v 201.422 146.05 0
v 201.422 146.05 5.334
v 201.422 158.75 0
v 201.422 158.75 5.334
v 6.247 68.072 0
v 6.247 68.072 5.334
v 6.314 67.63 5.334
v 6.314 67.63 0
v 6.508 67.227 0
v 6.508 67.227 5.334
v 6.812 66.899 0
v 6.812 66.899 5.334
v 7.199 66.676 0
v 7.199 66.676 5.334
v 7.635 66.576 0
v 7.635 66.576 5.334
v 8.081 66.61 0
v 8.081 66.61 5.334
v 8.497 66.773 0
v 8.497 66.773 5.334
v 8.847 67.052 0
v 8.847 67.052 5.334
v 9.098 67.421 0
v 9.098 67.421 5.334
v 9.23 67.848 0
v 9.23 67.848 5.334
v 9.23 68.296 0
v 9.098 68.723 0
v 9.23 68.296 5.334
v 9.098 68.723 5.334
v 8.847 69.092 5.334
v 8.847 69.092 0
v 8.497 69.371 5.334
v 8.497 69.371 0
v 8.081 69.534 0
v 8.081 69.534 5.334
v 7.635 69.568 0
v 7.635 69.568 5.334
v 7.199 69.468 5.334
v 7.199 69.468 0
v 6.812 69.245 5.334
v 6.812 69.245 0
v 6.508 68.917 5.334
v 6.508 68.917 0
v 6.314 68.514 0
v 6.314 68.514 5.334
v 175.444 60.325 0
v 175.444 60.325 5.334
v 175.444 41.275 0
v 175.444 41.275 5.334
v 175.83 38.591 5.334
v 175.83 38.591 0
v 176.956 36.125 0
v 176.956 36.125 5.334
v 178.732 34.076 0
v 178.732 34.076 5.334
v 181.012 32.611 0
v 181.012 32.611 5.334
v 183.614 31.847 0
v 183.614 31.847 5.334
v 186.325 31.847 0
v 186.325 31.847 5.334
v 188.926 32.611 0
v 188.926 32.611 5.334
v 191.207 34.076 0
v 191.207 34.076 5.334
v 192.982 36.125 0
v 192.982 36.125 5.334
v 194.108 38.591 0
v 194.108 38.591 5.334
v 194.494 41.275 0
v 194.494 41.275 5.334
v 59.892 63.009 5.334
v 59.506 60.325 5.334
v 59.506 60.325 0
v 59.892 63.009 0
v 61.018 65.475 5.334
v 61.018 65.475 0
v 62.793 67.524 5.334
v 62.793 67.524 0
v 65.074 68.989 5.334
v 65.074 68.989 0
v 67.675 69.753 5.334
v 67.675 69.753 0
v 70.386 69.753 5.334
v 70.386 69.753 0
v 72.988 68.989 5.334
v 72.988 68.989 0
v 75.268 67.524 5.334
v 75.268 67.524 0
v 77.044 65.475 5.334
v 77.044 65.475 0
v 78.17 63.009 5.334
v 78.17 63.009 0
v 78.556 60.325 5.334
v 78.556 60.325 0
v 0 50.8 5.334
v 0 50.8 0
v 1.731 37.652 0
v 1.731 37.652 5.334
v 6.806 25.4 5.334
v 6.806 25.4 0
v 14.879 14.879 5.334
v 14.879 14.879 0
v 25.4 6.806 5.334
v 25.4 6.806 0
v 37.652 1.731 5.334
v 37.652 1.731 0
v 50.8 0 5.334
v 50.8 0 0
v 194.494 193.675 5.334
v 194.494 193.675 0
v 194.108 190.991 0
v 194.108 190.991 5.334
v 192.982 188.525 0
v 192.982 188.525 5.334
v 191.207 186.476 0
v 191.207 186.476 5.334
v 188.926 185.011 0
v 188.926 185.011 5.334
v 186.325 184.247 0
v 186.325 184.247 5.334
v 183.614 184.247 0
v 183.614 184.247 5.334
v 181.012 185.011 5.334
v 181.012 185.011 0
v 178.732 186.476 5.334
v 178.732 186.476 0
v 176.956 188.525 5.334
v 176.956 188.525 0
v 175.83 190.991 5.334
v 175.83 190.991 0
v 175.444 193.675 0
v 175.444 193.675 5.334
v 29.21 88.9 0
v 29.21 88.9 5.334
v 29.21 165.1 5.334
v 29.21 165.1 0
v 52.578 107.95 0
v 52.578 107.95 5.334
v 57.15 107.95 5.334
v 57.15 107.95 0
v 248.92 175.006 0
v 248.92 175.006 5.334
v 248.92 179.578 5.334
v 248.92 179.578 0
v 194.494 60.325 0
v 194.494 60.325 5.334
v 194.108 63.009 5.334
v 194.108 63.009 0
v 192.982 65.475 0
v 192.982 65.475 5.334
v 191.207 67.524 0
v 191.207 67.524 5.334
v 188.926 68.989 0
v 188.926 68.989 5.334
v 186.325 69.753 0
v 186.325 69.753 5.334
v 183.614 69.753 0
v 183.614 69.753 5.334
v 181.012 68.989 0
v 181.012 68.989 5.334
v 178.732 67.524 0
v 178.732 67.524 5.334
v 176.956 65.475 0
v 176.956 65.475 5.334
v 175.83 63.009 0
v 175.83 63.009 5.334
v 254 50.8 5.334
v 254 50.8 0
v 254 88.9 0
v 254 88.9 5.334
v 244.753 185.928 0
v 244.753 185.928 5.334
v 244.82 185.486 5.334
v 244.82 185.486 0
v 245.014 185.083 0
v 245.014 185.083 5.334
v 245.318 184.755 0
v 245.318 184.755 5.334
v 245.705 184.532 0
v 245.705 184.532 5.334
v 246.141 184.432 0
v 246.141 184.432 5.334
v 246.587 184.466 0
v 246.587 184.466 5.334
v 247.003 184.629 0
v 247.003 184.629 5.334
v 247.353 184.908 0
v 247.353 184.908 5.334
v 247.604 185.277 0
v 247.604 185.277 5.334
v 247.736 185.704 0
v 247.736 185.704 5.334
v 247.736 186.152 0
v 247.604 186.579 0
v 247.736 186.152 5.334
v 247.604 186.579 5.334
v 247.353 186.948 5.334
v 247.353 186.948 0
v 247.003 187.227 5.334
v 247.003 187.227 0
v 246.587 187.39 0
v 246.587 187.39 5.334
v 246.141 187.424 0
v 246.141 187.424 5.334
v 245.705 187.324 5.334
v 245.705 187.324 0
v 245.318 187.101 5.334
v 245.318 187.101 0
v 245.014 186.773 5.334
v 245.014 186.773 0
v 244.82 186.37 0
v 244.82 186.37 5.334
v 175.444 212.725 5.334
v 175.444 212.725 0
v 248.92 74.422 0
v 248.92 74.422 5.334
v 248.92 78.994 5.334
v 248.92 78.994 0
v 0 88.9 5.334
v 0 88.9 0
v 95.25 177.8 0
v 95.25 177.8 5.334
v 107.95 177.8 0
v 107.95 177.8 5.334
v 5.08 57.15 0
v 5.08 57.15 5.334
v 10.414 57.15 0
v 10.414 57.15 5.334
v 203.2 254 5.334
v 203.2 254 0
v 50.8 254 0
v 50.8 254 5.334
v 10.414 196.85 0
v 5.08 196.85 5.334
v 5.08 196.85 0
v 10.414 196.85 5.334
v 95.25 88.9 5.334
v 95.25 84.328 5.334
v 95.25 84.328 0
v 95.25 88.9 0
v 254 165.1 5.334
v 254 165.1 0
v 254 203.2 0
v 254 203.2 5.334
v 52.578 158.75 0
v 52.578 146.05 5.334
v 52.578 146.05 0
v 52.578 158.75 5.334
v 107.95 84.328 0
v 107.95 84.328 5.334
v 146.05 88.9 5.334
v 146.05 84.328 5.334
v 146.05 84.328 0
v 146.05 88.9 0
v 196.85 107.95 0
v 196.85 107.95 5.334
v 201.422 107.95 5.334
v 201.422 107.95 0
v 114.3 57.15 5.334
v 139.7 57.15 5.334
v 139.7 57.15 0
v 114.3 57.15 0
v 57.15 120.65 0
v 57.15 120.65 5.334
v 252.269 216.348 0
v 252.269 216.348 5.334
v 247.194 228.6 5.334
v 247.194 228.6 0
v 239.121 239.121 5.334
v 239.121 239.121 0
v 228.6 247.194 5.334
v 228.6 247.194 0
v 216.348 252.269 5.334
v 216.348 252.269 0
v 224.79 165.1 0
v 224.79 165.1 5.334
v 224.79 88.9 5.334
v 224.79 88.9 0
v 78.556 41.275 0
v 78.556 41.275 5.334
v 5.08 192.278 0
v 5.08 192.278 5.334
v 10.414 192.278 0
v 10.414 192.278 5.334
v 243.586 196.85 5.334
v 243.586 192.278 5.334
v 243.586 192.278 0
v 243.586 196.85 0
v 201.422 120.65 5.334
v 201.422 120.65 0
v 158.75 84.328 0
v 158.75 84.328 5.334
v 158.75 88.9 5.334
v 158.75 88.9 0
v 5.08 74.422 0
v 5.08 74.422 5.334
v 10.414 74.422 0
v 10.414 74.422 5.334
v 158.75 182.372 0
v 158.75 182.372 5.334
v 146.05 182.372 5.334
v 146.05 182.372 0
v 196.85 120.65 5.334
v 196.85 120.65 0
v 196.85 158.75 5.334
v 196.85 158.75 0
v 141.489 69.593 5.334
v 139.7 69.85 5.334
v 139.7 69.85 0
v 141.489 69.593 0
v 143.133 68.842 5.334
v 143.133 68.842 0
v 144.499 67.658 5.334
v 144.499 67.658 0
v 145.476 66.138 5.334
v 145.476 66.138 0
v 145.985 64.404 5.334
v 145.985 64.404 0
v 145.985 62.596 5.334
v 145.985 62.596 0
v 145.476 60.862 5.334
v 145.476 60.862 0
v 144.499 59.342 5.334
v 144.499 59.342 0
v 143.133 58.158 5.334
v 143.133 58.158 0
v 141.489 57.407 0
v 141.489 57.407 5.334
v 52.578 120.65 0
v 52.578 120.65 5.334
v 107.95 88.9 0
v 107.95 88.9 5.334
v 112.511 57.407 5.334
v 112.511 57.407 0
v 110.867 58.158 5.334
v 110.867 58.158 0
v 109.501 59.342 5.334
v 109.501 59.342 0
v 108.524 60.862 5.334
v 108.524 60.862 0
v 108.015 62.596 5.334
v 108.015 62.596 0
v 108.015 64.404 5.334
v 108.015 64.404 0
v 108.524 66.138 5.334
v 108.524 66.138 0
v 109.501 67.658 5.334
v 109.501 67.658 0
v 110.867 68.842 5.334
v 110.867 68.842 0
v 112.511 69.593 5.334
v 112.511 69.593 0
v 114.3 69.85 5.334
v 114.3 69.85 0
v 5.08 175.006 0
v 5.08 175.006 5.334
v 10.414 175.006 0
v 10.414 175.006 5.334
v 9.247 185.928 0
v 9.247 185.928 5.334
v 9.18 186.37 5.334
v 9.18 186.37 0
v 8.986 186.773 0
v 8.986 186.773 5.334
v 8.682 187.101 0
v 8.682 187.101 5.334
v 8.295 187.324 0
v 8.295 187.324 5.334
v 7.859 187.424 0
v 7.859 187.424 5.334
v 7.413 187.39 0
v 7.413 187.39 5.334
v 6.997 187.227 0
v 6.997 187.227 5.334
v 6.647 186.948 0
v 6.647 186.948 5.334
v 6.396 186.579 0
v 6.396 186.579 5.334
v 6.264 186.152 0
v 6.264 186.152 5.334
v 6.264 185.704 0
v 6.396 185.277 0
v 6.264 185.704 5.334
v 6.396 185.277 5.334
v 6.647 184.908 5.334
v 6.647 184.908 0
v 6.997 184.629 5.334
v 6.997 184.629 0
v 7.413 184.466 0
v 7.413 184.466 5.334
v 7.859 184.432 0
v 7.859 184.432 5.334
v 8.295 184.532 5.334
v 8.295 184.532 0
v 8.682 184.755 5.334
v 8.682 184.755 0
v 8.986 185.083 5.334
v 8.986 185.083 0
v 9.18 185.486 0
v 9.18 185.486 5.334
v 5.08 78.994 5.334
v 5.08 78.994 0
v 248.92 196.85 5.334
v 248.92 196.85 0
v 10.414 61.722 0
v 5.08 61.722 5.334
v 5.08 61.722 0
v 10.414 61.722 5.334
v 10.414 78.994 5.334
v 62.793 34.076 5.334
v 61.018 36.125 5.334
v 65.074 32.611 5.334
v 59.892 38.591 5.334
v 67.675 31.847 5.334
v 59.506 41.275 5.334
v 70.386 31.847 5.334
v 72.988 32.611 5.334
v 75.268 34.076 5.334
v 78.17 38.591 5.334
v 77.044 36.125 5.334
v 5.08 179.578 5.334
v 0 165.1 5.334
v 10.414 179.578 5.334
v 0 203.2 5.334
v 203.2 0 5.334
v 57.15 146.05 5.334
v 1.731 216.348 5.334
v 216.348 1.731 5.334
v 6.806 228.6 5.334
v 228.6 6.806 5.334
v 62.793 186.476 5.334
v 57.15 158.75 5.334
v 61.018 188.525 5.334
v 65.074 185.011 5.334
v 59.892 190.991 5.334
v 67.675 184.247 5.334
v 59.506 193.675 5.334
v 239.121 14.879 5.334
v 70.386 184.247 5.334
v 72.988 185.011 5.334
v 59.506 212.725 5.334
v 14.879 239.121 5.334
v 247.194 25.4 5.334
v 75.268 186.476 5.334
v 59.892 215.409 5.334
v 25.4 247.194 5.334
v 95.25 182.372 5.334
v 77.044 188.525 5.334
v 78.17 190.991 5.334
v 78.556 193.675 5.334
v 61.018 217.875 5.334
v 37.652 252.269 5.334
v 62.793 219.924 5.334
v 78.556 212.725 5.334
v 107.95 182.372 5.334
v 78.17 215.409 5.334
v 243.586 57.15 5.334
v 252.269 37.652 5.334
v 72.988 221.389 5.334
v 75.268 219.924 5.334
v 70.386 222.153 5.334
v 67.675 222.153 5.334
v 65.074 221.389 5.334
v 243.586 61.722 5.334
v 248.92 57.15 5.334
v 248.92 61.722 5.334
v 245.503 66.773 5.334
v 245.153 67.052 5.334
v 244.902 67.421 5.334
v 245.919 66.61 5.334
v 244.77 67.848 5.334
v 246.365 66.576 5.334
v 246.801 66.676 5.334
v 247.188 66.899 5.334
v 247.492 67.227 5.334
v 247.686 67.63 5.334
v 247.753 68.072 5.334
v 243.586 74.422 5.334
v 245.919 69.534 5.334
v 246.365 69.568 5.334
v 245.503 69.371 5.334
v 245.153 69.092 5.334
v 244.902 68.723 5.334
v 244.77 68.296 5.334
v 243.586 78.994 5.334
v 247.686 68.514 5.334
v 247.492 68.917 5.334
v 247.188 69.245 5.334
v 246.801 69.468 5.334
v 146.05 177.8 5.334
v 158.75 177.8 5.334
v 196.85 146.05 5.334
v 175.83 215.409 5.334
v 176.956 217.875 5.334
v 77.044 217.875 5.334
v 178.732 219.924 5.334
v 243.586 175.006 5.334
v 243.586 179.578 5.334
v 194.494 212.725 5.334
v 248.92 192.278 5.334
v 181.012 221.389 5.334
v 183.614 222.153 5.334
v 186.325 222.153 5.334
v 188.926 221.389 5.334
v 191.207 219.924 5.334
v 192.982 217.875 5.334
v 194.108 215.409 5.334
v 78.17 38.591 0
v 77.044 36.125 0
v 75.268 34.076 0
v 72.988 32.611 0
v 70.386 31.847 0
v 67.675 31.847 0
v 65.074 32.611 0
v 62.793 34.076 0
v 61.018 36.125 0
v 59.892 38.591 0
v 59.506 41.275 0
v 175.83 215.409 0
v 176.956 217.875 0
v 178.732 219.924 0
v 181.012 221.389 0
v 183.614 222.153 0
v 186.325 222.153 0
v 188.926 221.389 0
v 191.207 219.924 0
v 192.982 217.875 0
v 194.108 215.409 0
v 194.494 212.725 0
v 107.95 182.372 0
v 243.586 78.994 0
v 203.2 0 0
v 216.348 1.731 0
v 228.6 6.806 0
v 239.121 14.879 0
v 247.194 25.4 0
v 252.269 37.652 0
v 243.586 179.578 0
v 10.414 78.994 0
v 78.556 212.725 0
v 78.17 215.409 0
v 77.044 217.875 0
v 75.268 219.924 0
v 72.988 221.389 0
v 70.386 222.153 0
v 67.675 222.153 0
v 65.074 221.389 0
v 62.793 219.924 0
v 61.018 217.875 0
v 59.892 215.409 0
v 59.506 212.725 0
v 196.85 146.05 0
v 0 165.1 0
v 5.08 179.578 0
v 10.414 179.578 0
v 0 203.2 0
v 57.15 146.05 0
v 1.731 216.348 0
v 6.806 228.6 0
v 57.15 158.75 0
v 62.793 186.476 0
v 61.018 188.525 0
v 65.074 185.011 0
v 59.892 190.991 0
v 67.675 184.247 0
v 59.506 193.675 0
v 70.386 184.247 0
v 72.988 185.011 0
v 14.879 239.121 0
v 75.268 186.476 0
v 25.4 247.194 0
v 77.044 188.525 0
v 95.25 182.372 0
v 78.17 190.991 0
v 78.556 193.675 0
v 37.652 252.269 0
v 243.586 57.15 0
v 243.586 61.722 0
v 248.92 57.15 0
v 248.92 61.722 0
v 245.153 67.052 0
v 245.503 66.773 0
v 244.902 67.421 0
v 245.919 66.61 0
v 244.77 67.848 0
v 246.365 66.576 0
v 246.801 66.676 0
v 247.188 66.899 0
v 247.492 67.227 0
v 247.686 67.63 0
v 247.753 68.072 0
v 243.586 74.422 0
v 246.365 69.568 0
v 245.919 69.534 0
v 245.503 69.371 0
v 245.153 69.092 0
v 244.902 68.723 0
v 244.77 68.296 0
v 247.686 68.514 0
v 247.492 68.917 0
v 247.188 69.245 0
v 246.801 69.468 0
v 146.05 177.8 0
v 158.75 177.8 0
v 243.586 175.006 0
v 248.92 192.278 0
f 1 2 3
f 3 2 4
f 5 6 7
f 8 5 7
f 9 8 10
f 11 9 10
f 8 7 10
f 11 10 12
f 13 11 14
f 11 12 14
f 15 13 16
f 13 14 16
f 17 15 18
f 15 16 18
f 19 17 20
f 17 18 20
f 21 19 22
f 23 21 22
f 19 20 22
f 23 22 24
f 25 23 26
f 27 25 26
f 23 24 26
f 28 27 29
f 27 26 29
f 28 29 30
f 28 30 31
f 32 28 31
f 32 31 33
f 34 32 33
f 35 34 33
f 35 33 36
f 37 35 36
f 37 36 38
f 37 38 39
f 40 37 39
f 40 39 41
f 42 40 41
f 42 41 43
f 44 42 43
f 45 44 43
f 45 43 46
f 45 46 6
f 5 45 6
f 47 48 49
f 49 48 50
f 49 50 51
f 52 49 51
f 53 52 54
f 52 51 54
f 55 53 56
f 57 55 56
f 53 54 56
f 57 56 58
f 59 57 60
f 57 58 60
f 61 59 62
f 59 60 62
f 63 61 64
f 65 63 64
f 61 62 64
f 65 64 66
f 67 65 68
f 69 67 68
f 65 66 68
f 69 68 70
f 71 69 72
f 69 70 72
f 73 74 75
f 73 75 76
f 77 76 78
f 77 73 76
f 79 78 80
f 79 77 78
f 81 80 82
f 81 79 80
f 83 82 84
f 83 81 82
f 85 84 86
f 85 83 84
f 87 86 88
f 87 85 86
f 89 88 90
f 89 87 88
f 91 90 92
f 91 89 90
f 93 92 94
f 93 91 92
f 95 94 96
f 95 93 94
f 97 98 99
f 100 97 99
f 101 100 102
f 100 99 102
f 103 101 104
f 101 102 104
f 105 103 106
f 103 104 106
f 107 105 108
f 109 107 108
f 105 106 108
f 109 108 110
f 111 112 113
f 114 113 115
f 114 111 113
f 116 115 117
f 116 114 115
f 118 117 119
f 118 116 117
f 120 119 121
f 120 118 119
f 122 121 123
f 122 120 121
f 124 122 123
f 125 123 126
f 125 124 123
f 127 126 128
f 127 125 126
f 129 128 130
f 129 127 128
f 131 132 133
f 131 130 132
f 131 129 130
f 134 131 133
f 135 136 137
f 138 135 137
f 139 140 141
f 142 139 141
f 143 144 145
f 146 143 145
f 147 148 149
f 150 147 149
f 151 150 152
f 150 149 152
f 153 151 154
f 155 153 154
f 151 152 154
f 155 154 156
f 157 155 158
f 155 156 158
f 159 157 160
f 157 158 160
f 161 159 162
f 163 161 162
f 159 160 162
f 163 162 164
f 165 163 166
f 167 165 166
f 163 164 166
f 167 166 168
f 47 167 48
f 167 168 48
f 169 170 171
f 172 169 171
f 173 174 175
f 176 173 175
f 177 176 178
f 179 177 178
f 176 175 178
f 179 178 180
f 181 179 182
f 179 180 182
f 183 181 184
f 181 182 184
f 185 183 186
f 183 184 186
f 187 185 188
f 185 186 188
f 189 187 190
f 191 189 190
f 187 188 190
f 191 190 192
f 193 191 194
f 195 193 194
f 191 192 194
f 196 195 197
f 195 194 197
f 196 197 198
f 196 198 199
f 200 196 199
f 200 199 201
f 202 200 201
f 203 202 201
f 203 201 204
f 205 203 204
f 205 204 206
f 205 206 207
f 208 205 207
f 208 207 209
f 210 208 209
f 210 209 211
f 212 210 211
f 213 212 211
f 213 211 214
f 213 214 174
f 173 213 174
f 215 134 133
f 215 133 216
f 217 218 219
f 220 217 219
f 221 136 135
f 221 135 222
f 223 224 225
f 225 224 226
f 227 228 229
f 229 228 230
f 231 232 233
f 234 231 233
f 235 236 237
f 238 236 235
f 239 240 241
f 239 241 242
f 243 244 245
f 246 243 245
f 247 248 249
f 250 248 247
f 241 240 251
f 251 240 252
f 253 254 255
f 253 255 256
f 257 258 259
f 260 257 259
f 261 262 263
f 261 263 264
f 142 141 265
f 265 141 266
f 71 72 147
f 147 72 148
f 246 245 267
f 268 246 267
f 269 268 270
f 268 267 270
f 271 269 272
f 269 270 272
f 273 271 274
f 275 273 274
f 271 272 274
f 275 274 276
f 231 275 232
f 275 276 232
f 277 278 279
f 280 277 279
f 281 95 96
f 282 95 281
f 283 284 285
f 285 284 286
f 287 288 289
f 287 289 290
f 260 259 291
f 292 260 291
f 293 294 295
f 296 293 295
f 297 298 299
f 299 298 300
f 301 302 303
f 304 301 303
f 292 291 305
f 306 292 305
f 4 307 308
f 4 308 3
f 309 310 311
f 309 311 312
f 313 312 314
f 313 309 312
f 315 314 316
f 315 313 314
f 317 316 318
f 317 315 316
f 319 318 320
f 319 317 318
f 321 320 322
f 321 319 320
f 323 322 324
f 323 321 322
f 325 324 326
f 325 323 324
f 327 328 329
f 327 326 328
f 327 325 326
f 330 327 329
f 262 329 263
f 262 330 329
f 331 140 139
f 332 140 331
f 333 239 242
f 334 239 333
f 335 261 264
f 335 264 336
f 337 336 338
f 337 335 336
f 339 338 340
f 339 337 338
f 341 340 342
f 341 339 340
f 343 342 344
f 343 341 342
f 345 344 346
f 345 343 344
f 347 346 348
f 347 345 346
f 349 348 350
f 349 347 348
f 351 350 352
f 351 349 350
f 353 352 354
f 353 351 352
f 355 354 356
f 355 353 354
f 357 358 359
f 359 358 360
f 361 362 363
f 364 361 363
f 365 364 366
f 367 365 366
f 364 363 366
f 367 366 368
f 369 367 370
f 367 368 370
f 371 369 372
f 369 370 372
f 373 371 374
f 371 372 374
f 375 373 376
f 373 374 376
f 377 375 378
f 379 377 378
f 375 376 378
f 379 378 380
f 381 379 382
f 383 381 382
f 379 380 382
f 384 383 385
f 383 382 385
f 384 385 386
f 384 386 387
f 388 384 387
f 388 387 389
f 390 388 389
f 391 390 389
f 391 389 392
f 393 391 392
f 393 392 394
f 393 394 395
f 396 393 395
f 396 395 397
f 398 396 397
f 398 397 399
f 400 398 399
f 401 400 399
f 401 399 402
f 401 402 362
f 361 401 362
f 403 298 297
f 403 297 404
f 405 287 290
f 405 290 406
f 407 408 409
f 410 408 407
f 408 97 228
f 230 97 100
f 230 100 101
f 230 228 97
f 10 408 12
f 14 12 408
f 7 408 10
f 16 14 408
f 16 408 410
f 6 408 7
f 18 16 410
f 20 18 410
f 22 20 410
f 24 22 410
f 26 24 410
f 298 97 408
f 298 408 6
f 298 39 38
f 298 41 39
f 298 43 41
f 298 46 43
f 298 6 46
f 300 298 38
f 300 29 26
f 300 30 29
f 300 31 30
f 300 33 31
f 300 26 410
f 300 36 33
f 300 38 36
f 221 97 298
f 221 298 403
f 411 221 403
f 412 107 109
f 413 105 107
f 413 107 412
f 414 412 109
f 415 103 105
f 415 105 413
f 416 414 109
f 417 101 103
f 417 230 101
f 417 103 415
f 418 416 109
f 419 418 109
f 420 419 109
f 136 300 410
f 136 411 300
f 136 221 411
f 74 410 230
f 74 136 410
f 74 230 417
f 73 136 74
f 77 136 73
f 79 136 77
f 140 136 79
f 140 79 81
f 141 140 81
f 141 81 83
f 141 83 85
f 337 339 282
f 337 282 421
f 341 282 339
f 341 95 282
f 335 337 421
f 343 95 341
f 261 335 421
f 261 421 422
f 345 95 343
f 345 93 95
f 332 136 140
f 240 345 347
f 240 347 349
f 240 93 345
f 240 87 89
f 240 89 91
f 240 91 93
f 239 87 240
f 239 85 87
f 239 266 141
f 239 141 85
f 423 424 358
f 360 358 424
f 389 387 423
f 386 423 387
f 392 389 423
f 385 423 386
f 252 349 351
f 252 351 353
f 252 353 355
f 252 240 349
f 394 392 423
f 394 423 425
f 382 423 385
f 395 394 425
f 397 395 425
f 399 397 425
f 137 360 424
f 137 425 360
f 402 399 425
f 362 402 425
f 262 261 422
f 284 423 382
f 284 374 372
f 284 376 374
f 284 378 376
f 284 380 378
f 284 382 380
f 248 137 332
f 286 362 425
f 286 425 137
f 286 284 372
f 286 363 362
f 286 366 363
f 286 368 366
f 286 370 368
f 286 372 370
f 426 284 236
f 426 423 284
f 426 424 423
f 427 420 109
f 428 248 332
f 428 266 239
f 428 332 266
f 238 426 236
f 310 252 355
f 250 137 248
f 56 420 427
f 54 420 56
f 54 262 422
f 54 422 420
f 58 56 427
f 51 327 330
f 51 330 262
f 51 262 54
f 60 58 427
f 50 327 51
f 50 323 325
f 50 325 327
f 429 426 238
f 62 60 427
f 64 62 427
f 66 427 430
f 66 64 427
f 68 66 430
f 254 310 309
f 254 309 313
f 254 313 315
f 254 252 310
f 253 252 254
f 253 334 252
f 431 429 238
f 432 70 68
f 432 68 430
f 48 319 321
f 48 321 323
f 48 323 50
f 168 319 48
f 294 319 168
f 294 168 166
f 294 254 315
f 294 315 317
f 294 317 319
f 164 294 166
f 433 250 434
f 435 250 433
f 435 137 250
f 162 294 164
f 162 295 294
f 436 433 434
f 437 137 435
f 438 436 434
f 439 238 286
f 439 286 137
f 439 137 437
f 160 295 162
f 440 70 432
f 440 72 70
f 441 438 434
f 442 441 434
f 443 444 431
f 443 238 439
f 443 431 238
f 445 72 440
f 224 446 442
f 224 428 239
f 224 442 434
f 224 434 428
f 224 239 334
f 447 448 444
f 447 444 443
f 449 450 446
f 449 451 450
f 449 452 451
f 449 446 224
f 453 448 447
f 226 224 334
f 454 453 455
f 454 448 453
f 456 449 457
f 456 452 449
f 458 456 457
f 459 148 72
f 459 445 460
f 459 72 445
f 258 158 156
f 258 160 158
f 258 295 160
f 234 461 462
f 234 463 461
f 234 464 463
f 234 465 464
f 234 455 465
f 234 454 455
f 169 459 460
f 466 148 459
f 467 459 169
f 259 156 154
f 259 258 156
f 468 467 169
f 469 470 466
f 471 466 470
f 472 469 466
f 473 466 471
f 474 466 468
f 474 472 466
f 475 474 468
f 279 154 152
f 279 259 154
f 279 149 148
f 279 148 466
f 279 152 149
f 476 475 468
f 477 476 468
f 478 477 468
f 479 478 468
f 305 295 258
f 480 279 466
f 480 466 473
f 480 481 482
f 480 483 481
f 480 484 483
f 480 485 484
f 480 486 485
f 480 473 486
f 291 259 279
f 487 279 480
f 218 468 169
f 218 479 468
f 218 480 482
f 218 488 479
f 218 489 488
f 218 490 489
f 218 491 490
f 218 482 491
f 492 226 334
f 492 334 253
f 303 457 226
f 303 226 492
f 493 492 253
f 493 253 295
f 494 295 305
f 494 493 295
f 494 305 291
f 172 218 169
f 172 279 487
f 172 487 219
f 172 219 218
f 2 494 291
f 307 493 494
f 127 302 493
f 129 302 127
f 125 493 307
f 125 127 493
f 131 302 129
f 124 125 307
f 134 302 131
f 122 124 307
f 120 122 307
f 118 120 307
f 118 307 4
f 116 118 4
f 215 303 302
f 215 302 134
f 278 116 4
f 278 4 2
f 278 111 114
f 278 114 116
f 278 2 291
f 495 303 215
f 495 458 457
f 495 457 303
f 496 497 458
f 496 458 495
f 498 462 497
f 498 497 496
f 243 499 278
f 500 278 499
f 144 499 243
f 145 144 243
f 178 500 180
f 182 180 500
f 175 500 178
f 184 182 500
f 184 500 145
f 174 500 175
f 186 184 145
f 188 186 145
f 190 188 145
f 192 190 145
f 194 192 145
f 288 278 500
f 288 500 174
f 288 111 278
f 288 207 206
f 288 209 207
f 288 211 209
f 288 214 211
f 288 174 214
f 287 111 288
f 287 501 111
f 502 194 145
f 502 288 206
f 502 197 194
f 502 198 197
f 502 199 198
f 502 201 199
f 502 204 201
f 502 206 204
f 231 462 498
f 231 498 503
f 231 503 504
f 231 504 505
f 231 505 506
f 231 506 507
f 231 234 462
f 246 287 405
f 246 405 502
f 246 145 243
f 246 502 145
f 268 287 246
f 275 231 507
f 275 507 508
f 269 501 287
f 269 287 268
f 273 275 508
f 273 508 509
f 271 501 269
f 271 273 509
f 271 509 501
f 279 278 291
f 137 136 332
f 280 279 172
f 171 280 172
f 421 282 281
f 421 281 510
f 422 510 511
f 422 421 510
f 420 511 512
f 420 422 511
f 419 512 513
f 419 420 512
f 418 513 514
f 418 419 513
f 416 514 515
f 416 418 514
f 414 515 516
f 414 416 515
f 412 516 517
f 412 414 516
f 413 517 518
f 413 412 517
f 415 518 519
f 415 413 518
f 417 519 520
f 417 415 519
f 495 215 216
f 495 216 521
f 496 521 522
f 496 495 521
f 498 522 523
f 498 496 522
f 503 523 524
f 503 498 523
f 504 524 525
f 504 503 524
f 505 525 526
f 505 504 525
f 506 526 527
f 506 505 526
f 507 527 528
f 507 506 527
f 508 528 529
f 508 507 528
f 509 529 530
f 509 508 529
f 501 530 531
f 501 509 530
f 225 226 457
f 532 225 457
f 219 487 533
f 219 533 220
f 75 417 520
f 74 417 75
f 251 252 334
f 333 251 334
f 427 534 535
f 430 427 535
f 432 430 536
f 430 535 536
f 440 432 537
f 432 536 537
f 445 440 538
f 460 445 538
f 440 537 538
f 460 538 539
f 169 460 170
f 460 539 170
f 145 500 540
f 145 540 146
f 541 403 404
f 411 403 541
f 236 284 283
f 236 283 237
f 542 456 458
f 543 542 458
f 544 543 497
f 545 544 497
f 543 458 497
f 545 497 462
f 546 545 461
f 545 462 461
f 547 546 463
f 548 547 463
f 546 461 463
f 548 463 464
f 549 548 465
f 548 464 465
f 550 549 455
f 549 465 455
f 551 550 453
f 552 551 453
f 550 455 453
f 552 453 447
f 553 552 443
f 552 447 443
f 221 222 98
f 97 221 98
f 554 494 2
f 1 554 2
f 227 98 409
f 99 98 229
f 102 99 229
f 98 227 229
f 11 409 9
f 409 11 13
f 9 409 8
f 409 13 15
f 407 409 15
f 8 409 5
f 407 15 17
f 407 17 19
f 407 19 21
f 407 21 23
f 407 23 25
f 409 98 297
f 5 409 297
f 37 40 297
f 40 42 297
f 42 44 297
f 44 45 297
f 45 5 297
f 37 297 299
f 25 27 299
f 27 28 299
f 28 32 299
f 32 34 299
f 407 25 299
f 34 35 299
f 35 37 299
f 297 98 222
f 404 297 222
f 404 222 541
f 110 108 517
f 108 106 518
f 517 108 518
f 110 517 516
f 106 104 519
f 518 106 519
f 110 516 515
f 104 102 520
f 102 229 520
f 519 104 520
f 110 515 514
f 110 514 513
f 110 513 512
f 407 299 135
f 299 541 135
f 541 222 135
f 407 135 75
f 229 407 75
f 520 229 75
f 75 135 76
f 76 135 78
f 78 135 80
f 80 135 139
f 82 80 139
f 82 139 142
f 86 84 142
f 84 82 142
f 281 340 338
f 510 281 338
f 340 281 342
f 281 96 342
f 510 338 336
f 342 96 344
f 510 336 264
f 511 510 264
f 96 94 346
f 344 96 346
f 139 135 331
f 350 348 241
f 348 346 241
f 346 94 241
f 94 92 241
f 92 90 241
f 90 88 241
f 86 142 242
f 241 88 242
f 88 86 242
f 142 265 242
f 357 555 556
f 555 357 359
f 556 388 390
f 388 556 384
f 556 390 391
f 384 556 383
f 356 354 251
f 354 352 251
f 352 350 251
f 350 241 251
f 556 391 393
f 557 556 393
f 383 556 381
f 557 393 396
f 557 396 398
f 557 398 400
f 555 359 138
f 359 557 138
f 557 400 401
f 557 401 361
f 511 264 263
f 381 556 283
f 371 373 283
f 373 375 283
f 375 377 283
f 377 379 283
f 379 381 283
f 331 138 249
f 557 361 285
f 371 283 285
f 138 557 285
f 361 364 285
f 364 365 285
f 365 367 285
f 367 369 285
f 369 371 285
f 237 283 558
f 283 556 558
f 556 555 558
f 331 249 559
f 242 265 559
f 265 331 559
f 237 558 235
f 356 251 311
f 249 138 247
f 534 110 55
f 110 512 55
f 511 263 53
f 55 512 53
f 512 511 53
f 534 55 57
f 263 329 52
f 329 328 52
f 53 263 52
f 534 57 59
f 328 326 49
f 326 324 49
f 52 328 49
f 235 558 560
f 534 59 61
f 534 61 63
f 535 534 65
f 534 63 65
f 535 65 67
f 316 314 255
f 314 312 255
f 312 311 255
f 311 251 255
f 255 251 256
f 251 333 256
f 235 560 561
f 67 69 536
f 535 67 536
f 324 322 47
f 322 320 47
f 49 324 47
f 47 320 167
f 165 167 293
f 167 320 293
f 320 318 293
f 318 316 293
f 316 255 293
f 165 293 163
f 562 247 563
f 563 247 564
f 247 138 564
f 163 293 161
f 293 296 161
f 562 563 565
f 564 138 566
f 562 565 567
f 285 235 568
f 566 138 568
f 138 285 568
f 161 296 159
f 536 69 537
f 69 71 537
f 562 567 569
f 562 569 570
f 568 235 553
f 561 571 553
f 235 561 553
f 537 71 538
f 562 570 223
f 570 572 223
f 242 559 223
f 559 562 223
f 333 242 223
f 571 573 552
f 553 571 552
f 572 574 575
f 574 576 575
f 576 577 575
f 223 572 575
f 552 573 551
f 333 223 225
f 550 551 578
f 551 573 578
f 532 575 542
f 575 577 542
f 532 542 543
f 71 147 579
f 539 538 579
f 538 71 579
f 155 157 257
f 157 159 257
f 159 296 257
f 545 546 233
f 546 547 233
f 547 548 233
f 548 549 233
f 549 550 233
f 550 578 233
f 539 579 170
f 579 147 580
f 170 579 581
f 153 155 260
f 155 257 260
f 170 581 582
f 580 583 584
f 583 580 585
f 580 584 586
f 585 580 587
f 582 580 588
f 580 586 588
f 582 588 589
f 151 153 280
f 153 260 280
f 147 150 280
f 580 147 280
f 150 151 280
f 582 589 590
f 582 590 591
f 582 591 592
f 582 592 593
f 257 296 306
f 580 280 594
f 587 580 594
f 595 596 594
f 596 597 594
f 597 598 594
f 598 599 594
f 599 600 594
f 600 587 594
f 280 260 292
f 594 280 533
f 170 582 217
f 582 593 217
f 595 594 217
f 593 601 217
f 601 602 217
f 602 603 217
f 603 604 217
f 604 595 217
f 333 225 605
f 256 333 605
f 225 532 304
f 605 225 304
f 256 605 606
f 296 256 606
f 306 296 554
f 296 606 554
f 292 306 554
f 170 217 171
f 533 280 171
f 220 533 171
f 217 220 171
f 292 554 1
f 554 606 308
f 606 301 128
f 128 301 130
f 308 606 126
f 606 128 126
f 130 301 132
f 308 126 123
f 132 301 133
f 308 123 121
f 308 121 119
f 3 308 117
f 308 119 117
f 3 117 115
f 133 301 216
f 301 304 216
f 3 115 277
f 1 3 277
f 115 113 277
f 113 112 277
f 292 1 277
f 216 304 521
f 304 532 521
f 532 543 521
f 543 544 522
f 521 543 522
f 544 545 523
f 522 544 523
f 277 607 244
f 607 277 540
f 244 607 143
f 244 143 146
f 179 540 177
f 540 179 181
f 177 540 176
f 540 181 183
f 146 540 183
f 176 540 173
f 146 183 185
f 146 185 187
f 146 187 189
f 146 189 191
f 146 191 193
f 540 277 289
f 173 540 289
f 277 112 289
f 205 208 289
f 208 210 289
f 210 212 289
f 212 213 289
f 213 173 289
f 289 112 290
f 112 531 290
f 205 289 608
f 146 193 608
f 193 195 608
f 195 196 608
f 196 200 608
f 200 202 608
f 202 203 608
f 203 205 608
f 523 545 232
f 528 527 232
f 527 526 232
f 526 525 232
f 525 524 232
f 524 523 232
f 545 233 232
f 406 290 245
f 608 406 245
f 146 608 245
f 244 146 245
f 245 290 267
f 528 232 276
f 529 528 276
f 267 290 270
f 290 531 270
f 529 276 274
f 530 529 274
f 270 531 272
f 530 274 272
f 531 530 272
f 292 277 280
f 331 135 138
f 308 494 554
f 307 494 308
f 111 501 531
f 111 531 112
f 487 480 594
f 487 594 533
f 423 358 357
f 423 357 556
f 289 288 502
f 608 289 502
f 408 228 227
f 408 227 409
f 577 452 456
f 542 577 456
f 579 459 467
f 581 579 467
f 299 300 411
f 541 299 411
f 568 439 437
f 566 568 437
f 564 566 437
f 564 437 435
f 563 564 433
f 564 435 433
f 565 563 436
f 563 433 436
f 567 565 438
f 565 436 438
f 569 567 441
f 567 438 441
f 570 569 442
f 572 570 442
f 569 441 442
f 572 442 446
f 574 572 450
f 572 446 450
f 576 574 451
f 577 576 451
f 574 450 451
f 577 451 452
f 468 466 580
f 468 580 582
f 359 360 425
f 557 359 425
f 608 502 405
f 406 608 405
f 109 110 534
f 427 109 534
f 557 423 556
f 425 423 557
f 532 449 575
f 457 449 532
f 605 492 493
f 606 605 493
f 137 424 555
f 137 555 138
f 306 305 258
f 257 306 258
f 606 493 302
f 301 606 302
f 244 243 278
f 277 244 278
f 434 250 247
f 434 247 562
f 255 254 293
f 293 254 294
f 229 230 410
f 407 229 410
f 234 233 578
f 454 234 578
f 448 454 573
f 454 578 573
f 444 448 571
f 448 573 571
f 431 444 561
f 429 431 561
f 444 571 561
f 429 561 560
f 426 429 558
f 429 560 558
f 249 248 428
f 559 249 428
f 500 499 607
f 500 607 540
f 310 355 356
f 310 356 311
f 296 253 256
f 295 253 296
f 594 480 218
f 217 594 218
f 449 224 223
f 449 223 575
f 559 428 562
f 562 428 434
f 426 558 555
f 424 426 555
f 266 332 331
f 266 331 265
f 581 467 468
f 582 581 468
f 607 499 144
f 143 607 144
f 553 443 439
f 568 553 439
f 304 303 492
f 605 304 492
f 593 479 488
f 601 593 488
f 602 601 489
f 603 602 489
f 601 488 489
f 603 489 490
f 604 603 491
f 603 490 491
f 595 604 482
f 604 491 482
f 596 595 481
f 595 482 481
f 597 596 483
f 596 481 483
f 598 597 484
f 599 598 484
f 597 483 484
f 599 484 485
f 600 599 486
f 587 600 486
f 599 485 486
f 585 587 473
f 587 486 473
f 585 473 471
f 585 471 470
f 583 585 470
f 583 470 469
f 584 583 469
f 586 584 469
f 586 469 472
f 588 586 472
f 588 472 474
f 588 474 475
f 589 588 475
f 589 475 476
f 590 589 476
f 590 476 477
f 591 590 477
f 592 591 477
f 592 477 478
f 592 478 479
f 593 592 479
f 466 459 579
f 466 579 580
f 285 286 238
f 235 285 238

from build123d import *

# Parameters (mm, degrees)
BOSS_EXTRUDE1_DEPTH = 5.334
CUT_EXTRUDE1_DEPTH  = 5.334
SKETCH6_R           = 1.5
SKETCH6_W           = 5.334
SKETCH6_H           = 4.572
CUT_EXTRUDE4_DEPTH  = 360.249845589
CUT_EXTRUDE5_DEPTH  = 360.249845589
CUT_EXTRUDE6_DEPTH  = 7.62
SKETCH11_W          = 12.7
SKETCH11_H          = 4.572
SKETCH11_W_2        = 4.572
SKETCH11_H_2        = 12.7
CUT_EXTRUDE9_DEPTH  = 360.249845589


with BuildPart() as part:
    # Sketch1 → Boss-Extrude1 (new body)
    with BuildSketch(Plane.XY):
        with BuildLine():
            Line((50.8, 0), (203.2, 0))
            ThreePointArc((203.2, 0), (239.121024484, 14.878975516), (254, 50.8))
            Line((254, 50.8), (254, 203.2))
            ThreePointArc((254, 203.2), (239.121024484, 239.121024484), (203.2, 254))
            Line((203.2, 254), (50.8, 254))
            ThreePointArc((50.8, 254), (14.878975516, 239.121024484), (0, 203.2))
            Line((0, 203.2), (0, 50.8))
            ThreePointArc((0, 50.8), (14.878975516, 14.878975516), (50.8, 0))
        make_face()
    extrude(amount=BOSS_EXTRUDE1_DEPTH)

    # Sketch3 → Cut-Extrude1 (cut)
    with BuildSketch(Plane.XY.offset(5.334)):
        Polygon((29.21, 95.25), (29.21, 88.9), (0, 88.9), (0, 165.1), (29.21, 165.1), (29.21, 158.75), (29.21, 146.05), (29.21, 133.35), (29.21, 120.65), (29.21, 107.95), align=None)
        Polygon((254, 165.1), (224.79, 165.1), (224.79, 158.75), (224.79, 146.05), (224.79, 133.35), (224.79, 120.65), (224.79, 107.95), (224.79, 95.25), (224.79, 88.9), (254, 88.9), align=None)
    extrude(amount=-CUT_EXTRUDE1_DEPTH, mode=Mode.SUBTRACT)

    # Sketch6 → Cut-Extrude4 (cut, through all)
    with BuildSketch(Plane.XY.offset(5.334)):
        with Locations((7.747, 185.928)):
            Circle(SKETCH6_R)
        with Locations(Location((246.253, 185.928, 0), (0, 0, 180))):
            Circle(SKETCH6_R)
        with Locations((246.253, 68.072)):
            Circle(SKETCH6_R)
        with Locations(Location((7.747, 68.072, 0), (0, 0, 180))):
            Circle(SKETCH6_R)
        with Locations((7.747, 194.564)):
            Rectangle(SKETCH6_W, SKETCH6_H)
        with Locations((7.747, 177.292)):
            Rectangle(SKETCH6_W, SKETCH6_H)
        with Locations((246.253, 177.292)):
            Rectangle(SKETCH6_W, SKETCH6_H)
        with Locations((246.253, 194.564)):
            Rectangle(SKETCH6_W, SKETCH6_H)
        with Locations((246.253, 59.436)):
            Rectangle(SKETCH6_W, SKETCH6_H)
        with Locations((246.253, 76.708)):
            Rectangle(SKETCH6_W, SKETCH6_H)
        with Locations((7.747, 76.708)):
            Rectangle(SKETCH6_W, SKETCH6_H)
        with Locations((7.747, 59.436)):
            Rectangle(SKETCH6_W, SKETCH6_H)
    extrude(amount=-CUT_EXTRUDE4_DEPTH, mode=Mode.SUBTRACT)

    # Sketch7 → Cut-Extrude5 (cut, through all)
    with BuildSketch(Plane.XY.offset(5.334)):
        with BuildLine():
            Line((78.555827904, 60.325), (78.555827904, 41.275))
            ThreePointArc((78.555827904, 41.275), (69.030827904, 31.75), (59.505827904, 41.275))
            Line((59.505827904, 41.275), (59.505827904, 60.325))
            ThreePointArc((59.505827904, 60.325), (69.030827904, 69.85), (78.555827904, 60.325))
        make_face()
        with BuildLine():
            Line((175.444172096, 60.325), (175.444172096, 41.275))
            ThreePointArc((175.444172096, 41.275), (184.969172096, 31.75), (194.494172096, 41.275))
            Line((194.494172096, 41.275), (194.494172096, 60.325))
            ThreePointArc((194.494172096, 60.325), (184.969172096, 69.85), (175.444172096, 60.325))
        make_face()
        with BuildLine():
            Line((175.444172096, 193.675), (175.444172096, 212.725))
            ThreePointArc((175.444172096, 212.725), (184.969172096, 222.25), (194.494172096, 212.725))
            Line((194.494172096, 212.725), (194.494172096, 193.675))
            ThreePointArc((194.494172096, 193.675), (184.969172096, 184.15), (175.444172096, 193.675))
        make_face()
        with BuildLine():
            Line((78.555827904, 193.675), (78.555827904, 212.725))
            ThreePointArc((78.555827904, 212.725), (69.030827904, 222.25), (59.505827904, 212.725))
            Line((59.505827904, 212.725), (59.505827904, 193.675))
            ThreePointArc((59.505827904, 193.675), (69.030827904, 184.15), (78.555827904, 193.675))
        make_face()
    extrude(amount=-CUT_EXTRUDE5_DEPTH, mode=Mode.SUBTRACT)

    # Sketch8 → Cut-Extrude6 (cut)
    with BuildSketch(Plane.XY.offset(5.334)):
        with BuildLine():
            Line((114.3, 69.85), (139.7, 69.85))
            ThreePointArc((139.7, 69.85), (146.05, 63.5), (139.7, 57.15))
            Line((139.7, 57.15), (114.3, 57.15))
            ThreePointArc((114.3, 57.15), (107.95, 63.5), (114.3, 69.85))
        make_face()
    extrude(amount=-CUT_EXTRUDE6_DEPTH, mode=Mode.SUBTRACT)

    # Sketch11 → Cut-Extrude9 (cut, through all)
    with BuildSketch(Plane.XY.offset(5.334)):
        Polygon((146.05, 182.372), (146.05, 177.8), (158.603579352, 177.8), (158.75, 177.8), (158.75, 182.372), align=None)
        with Locations((101.6, 180.086)):
            Rectangle(SKETCH11_W, SKETCH11_H)
        with Locations((199.136, 152.4)):
            Rectangle(SKETCH11_W_2, SKETCH11_H_2)
        Polygon((196.85, 108.5), (196.85, 107.95), (201.422, 107.95), (201.422, 120.65), (196.85, 120.65), align=None)
        with Locations((152.4, 86.614)):
            Rectangle(SKETCH11_W, SKETCH11_H)
        with Locations((101.6, 86.614)):
            Rectangle(SKETCH11_W, SKETCH11_H)
        with Locations((54.864, 114.3)):
            Rectangle(SKETCH11_W_2, SKETCH11_H_2)
        with Locations((54.864, 152.4)):
            Rectangle(SKETCH11_W_2, SKETCH11_H_2)
    extrude(amount=-CUT_EXTRUDE9_DEPTH, mode=Mode.SUBTRACT)


solid = part.part
